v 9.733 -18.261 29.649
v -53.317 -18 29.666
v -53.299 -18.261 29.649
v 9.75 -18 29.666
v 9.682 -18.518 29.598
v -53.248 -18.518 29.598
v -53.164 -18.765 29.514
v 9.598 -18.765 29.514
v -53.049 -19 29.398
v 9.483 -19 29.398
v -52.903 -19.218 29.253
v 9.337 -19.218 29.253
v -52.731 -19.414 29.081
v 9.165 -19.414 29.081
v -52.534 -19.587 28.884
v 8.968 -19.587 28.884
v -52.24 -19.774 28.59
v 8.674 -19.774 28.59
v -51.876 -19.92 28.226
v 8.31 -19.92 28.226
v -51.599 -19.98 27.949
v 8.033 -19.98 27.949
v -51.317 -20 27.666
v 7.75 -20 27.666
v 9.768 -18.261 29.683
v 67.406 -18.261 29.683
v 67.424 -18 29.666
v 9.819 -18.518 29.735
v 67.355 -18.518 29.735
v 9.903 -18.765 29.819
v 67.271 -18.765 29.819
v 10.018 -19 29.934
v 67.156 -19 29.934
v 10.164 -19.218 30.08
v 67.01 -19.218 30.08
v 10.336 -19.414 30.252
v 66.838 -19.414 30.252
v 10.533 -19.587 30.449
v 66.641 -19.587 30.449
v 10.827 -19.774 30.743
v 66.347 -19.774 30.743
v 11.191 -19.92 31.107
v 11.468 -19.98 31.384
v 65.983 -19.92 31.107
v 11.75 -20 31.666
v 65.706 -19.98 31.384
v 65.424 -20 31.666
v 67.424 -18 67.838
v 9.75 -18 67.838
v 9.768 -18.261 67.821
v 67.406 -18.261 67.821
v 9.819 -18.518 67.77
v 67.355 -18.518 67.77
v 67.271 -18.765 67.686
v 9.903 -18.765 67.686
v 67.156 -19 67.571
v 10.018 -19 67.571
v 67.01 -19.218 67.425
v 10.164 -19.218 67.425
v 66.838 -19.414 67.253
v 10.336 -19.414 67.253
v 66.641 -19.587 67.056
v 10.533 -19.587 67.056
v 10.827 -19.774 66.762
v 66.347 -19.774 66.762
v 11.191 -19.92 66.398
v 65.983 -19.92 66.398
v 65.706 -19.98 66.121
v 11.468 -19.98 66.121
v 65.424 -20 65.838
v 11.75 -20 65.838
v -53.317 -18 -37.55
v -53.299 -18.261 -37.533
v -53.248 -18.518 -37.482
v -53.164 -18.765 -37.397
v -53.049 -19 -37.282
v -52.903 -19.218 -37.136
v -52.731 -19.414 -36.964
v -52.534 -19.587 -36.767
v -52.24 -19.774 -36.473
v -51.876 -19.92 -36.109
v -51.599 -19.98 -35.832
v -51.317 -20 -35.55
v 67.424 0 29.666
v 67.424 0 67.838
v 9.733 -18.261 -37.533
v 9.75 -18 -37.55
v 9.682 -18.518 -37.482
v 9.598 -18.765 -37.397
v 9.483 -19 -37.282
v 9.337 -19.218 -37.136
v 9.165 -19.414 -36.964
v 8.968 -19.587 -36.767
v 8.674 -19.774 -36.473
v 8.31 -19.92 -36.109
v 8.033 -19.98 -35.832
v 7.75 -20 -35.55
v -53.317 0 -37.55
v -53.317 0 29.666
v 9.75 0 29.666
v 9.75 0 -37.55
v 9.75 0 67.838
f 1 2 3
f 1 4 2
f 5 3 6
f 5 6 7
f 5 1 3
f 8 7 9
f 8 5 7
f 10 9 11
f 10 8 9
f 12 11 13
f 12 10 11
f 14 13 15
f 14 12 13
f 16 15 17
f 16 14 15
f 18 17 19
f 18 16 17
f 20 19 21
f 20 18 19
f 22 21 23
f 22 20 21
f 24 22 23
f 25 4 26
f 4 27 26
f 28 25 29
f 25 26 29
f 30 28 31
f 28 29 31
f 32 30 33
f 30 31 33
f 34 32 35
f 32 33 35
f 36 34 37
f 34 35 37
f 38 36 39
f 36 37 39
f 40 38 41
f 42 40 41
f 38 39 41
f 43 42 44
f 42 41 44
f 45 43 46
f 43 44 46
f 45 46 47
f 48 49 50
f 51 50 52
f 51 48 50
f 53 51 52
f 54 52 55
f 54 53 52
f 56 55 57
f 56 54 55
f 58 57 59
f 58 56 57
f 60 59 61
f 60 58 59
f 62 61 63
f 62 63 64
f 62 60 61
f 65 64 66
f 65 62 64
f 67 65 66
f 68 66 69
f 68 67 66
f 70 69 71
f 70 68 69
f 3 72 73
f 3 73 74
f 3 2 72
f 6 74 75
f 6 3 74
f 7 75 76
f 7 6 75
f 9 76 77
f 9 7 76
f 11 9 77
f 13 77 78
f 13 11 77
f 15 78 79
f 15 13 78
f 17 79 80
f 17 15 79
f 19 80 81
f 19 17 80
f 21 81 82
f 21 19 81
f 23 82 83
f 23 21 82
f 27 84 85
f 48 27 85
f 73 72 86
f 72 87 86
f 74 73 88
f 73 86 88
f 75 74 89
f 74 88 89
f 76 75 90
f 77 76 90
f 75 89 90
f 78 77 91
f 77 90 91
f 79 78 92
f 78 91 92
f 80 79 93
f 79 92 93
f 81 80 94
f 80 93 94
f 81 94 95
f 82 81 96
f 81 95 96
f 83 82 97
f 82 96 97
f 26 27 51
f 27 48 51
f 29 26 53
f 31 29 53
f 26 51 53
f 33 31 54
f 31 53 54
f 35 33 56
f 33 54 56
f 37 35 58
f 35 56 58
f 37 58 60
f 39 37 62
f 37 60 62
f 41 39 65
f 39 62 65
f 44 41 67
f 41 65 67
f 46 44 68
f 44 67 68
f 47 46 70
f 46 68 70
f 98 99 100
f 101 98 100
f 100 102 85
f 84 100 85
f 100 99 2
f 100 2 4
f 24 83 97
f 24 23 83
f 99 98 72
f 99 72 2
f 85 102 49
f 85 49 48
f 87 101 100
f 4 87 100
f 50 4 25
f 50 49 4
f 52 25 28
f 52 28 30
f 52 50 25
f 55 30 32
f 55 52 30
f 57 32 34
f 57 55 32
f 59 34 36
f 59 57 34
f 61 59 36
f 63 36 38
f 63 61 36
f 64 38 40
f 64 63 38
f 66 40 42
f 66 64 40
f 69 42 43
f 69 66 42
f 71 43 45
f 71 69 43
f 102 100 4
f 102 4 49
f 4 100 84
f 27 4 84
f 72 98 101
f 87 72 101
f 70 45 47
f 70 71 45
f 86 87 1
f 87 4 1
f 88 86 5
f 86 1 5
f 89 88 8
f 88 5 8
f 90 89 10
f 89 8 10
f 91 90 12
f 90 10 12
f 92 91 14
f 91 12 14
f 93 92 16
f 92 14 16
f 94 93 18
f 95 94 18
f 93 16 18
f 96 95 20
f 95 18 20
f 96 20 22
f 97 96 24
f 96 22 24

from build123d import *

# Parameters (mm, degrees)
F0_W     = 63.0669742823
F0_H     = 67.2161057591
F1_DEPTH = 20
F0_W_2   = 57.6730966568
F0_H_2   = 38.1721183658
F2_R     = 2
F2_2_R   = 2


with BuildPart() as f1:
    # F0 (on Front) → F1 (new body)
    with BuildSketch(Plane.XZ):
        with Locations((-21.7830315232, -3.941681236)):
            Rectangle(F0_W, F0_H)
    extrude(amount=F1_DEPTH)

    # F2
    f2_edges = [f1.edges().sort_by_distance(p)[0] for p in [
        (-21.783032, -20, -37.549734),
        (-53.316519, -20, -3.941681),
        (-21.783032, -20, 29.666372),
        (9.750456, -20, -3.941681),
    ]]
    fillet(f2_edges, radius=F2_R)


with BuildPart() as f1b:
    # F0 (on Front) → F1, piece 2 (new body)
    with BuildSketch(Plane.XZ):
        with Locations((38.5870039463, 48.7524308264)):
            Rectangle(F0_W_2, F0_H_2)
    extrude(amount=F1_DEPTH)

    # F2#2
    f2_2_edges = [f1b.edges().sort_by_distance(p)[0] for p in [
        (38.587004, -20, 29.666372),
        (38.587004, -20, 67.83849),
        (67.423552, -20, 48.752431),
        (9.750456, -20, 48.752431),
    ]]
    fillet(f2_2_edges, radius=F2_2_R)


solid = Compound([f1.part, f1b.part])
